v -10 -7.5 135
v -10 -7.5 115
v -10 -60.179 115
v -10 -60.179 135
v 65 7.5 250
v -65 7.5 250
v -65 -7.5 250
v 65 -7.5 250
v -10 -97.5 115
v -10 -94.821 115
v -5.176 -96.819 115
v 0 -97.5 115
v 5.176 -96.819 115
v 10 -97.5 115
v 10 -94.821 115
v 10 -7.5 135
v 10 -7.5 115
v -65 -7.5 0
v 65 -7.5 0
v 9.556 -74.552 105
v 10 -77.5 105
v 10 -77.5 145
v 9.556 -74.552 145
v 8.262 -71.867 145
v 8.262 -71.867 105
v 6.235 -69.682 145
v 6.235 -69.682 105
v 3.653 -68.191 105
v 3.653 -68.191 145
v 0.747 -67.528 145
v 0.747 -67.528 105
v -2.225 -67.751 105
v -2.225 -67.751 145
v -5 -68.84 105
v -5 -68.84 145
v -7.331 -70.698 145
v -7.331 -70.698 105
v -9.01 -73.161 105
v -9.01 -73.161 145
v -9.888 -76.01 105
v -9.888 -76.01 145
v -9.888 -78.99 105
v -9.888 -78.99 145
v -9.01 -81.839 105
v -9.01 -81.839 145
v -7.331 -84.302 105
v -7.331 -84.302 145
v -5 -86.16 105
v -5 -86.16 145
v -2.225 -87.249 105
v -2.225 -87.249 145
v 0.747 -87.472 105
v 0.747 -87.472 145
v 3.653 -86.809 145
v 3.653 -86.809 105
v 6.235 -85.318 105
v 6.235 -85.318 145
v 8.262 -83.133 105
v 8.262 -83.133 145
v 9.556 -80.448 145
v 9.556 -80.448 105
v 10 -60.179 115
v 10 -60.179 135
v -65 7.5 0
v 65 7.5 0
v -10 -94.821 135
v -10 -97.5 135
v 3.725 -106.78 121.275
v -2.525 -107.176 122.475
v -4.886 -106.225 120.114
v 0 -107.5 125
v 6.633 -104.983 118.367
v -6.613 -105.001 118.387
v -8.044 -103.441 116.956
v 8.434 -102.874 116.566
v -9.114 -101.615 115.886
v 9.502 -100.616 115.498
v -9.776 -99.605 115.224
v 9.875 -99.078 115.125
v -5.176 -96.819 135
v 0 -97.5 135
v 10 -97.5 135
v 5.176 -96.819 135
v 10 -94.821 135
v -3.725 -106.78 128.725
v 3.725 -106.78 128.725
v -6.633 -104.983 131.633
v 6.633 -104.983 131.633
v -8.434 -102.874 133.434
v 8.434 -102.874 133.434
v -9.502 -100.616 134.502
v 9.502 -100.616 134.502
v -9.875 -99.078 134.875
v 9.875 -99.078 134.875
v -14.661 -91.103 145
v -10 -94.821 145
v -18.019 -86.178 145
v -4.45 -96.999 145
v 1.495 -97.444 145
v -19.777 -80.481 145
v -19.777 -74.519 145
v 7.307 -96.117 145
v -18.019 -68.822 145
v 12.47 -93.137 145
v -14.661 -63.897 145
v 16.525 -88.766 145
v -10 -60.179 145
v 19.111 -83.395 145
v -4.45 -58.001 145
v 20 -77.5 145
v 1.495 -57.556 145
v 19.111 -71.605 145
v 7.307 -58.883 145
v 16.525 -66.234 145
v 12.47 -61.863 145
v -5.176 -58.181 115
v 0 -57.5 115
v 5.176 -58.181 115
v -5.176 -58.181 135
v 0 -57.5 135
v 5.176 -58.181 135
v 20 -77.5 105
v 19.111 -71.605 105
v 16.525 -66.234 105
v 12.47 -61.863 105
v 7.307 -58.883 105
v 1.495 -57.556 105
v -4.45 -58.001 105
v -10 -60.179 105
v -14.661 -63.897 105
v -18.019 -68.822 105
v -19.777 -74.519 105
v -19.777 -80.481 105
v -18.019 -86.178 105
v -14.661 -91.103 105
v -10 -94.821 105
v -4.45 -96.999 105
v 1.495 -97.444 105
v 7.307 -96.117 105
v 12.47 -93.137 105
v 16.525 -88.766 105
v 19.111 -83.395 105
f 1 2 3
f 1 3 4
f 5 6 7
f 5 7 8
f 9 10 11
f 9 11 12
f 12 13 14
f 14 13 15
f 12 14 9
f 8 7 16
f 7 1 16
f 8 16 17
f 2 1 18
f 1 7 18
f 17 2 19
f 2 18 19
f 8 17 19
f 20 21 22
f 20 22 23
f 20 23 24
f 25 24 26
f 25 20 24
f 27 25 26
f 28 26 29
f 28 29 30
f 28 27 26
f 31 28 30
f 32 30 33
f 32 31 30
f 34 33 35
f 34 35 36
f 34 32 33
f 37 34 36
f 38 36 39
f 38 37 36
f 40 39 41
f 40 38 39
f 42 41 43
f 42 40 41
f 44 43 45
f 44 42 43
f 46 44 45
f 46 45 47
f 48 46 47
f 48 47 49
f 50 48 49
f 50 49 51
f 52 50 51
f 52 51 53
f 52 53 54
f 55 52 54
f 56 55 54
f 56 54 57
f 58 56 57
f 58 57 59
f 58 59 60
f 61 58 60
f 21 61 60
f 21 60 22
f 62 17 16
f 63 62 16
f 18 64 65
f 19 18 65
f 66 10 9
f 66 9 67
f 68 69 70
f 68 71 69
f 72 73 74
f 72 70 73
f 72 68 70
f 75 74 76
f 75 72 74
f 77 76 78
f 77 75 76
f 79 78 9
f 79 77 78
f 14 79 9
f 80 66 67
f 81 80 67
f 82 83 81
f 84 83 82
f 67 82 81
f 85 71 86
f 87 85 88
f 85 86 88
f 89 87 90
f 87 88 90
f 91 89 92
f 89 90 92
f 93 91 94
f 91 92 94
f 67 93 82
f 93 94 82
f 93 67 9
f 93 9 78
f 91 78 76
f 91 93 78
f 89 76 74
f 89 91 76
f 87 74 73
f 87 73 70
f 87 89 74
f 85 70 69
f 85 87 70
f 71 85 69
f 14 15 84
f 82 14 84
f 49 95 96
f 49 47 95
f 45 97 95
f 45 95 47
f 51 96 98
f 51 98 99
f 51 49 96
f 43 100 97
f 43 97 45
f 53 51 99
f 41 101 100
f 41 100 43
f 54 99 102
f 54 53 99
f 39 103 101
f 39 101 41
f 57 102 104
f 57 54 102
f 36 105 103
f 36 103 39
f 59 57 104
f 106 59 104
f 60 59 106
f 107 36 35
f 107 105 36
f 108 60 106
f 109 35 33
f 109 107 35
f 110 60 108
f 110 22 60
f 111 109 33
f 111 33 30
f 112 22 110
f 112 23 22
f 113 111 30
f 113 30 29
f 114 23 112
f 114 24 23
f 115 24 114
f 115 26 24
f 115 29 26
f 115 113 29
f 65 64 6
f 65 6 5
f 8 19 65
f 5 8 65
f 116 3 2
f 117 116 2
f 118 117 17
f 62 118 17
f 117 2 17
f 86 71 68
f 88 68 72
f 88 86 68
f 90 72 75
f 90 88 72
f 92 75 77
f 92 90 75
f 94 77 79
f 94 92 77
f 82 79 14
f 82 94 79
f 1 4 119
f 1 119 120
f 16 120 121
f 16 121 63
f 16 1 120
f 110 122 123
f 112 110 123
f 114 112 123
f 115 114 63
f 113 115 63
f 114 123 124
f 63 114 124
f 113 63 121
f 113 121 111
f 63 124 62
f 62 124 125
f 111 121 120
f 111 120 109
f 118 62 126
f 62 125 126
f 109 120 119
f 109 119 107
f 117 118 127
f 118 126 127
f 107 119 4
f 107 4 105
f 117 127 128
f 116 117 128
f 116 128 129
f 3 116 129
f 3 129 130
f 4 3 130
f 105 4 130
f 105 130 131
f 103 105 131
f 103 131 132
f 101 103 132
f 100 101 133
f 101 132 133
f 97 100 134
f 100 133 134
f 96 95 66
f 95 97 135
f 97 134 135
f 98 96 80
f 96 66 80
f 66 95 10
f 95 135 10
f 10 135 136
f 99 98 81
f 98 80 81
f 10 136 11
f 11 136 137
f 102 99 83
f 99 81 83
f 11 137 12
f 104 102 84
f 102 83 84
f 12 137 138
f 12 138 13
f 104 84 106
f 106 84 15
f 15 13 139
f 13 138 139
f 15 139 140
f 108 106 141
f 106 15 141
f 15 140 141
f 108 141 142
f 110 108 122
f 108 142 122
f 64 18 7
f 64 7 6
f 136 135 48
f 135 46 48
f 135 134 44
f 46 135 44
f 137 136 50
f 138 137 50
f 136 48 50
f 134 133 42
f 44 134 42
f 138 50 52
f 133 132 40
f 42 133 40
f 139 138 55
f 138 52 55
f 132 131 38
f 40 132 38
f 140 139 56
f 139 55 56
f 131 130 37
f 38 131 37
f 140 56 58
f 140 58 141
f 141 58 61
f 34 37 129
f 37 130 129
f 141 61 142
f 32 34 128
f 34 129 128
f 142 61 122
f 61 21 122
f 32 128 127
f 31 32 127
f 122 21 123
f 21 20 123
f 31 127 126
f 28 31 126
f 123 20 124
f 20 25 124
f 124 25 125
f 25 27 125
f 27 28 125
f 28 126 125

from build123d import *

# Parameters (mm, degrees)
SKETCH1_W                = 130
SKETCH1_H                = 15
BOSS_EXTRUDE1_DEPTH      = 250
SKETCH2_W                = 20
SKETCH2_H                = 20
BOSS_EXTRUDE3_DEPTH      = 100
BOSS_EXTRUDE4_DEPTH      = 10
BOSS_EXTRUDE4_DEPTH_BACK = 30
SKETCH3_R                = 20
SKETCH3_R_2              = 10
SKETCH4_R                = 10
CUT_EXTRUDE1_DEPTH       = 185.407836059
FILLET1_R                = 10


with BuildPart() as part:
    # Sketch1 → Boss-Extrude1 (new body)
    with BuildSketch(Plane.XY):
        Rectangle(SKETCH1_W, SKETCH1_H)
    extrude(amount=BOSS_EXTRUDE1_DEPTH)

    # Sketch2 → Boss-Extrude3 (add)
    with BuildSketch(Plane.XZ.offset(7.5)):
        with Locations((0, 125)):
            Rectangle(SKETCH2_W, SKETCH2_H)
    extrude(amount=BOSS_EXTRUDE3_DEPTH)

    # Sketch3 → Boss-Extrude4 (add, two sides: drawn at the far end of the back side and taken through both)
    with BuildSketch(Plane.XY.offset(135).offset(-BOSS_EXTRUDE4_DEPTH_BACK)):
        with Locations((0, -77.5)):
            Circle(SKETCH3_R)
        with Locations((0, -77.5)):
            Circle(SKETCH3_R_2, mode=Mode.SUBTRACT)
    extrude(amount=BOSS_EXTRUDE4_DEPTH + BOSS_EXTRUDE4_DEPTH_BACK)

    # Sketch4 → Cut-Extrude1 (cut, through all)
    with BuildSketch(Plane.XY.offset(135)):
        with Locations((0, -77.5)):
            Circle(SKETCH4_R)
    extrude(amount=-CUT_EXTRUDE1_DEPTH, mode=Mode.SUBTRACT)

    # Fillet1
    fillet1_edges = [part.edges().sort_by_distance(p)[0] for p in [
        (10, -107.5, 125),
        (0, -107.5, 135),
        (-10, -107.5, 125),
        (0, -107.5, 115),
    ]]
    fillet(fillet1_edges, radius=FILLET1_R - 0.0001)  # a hair under: the kernel refuses the full size


solid = part.part
